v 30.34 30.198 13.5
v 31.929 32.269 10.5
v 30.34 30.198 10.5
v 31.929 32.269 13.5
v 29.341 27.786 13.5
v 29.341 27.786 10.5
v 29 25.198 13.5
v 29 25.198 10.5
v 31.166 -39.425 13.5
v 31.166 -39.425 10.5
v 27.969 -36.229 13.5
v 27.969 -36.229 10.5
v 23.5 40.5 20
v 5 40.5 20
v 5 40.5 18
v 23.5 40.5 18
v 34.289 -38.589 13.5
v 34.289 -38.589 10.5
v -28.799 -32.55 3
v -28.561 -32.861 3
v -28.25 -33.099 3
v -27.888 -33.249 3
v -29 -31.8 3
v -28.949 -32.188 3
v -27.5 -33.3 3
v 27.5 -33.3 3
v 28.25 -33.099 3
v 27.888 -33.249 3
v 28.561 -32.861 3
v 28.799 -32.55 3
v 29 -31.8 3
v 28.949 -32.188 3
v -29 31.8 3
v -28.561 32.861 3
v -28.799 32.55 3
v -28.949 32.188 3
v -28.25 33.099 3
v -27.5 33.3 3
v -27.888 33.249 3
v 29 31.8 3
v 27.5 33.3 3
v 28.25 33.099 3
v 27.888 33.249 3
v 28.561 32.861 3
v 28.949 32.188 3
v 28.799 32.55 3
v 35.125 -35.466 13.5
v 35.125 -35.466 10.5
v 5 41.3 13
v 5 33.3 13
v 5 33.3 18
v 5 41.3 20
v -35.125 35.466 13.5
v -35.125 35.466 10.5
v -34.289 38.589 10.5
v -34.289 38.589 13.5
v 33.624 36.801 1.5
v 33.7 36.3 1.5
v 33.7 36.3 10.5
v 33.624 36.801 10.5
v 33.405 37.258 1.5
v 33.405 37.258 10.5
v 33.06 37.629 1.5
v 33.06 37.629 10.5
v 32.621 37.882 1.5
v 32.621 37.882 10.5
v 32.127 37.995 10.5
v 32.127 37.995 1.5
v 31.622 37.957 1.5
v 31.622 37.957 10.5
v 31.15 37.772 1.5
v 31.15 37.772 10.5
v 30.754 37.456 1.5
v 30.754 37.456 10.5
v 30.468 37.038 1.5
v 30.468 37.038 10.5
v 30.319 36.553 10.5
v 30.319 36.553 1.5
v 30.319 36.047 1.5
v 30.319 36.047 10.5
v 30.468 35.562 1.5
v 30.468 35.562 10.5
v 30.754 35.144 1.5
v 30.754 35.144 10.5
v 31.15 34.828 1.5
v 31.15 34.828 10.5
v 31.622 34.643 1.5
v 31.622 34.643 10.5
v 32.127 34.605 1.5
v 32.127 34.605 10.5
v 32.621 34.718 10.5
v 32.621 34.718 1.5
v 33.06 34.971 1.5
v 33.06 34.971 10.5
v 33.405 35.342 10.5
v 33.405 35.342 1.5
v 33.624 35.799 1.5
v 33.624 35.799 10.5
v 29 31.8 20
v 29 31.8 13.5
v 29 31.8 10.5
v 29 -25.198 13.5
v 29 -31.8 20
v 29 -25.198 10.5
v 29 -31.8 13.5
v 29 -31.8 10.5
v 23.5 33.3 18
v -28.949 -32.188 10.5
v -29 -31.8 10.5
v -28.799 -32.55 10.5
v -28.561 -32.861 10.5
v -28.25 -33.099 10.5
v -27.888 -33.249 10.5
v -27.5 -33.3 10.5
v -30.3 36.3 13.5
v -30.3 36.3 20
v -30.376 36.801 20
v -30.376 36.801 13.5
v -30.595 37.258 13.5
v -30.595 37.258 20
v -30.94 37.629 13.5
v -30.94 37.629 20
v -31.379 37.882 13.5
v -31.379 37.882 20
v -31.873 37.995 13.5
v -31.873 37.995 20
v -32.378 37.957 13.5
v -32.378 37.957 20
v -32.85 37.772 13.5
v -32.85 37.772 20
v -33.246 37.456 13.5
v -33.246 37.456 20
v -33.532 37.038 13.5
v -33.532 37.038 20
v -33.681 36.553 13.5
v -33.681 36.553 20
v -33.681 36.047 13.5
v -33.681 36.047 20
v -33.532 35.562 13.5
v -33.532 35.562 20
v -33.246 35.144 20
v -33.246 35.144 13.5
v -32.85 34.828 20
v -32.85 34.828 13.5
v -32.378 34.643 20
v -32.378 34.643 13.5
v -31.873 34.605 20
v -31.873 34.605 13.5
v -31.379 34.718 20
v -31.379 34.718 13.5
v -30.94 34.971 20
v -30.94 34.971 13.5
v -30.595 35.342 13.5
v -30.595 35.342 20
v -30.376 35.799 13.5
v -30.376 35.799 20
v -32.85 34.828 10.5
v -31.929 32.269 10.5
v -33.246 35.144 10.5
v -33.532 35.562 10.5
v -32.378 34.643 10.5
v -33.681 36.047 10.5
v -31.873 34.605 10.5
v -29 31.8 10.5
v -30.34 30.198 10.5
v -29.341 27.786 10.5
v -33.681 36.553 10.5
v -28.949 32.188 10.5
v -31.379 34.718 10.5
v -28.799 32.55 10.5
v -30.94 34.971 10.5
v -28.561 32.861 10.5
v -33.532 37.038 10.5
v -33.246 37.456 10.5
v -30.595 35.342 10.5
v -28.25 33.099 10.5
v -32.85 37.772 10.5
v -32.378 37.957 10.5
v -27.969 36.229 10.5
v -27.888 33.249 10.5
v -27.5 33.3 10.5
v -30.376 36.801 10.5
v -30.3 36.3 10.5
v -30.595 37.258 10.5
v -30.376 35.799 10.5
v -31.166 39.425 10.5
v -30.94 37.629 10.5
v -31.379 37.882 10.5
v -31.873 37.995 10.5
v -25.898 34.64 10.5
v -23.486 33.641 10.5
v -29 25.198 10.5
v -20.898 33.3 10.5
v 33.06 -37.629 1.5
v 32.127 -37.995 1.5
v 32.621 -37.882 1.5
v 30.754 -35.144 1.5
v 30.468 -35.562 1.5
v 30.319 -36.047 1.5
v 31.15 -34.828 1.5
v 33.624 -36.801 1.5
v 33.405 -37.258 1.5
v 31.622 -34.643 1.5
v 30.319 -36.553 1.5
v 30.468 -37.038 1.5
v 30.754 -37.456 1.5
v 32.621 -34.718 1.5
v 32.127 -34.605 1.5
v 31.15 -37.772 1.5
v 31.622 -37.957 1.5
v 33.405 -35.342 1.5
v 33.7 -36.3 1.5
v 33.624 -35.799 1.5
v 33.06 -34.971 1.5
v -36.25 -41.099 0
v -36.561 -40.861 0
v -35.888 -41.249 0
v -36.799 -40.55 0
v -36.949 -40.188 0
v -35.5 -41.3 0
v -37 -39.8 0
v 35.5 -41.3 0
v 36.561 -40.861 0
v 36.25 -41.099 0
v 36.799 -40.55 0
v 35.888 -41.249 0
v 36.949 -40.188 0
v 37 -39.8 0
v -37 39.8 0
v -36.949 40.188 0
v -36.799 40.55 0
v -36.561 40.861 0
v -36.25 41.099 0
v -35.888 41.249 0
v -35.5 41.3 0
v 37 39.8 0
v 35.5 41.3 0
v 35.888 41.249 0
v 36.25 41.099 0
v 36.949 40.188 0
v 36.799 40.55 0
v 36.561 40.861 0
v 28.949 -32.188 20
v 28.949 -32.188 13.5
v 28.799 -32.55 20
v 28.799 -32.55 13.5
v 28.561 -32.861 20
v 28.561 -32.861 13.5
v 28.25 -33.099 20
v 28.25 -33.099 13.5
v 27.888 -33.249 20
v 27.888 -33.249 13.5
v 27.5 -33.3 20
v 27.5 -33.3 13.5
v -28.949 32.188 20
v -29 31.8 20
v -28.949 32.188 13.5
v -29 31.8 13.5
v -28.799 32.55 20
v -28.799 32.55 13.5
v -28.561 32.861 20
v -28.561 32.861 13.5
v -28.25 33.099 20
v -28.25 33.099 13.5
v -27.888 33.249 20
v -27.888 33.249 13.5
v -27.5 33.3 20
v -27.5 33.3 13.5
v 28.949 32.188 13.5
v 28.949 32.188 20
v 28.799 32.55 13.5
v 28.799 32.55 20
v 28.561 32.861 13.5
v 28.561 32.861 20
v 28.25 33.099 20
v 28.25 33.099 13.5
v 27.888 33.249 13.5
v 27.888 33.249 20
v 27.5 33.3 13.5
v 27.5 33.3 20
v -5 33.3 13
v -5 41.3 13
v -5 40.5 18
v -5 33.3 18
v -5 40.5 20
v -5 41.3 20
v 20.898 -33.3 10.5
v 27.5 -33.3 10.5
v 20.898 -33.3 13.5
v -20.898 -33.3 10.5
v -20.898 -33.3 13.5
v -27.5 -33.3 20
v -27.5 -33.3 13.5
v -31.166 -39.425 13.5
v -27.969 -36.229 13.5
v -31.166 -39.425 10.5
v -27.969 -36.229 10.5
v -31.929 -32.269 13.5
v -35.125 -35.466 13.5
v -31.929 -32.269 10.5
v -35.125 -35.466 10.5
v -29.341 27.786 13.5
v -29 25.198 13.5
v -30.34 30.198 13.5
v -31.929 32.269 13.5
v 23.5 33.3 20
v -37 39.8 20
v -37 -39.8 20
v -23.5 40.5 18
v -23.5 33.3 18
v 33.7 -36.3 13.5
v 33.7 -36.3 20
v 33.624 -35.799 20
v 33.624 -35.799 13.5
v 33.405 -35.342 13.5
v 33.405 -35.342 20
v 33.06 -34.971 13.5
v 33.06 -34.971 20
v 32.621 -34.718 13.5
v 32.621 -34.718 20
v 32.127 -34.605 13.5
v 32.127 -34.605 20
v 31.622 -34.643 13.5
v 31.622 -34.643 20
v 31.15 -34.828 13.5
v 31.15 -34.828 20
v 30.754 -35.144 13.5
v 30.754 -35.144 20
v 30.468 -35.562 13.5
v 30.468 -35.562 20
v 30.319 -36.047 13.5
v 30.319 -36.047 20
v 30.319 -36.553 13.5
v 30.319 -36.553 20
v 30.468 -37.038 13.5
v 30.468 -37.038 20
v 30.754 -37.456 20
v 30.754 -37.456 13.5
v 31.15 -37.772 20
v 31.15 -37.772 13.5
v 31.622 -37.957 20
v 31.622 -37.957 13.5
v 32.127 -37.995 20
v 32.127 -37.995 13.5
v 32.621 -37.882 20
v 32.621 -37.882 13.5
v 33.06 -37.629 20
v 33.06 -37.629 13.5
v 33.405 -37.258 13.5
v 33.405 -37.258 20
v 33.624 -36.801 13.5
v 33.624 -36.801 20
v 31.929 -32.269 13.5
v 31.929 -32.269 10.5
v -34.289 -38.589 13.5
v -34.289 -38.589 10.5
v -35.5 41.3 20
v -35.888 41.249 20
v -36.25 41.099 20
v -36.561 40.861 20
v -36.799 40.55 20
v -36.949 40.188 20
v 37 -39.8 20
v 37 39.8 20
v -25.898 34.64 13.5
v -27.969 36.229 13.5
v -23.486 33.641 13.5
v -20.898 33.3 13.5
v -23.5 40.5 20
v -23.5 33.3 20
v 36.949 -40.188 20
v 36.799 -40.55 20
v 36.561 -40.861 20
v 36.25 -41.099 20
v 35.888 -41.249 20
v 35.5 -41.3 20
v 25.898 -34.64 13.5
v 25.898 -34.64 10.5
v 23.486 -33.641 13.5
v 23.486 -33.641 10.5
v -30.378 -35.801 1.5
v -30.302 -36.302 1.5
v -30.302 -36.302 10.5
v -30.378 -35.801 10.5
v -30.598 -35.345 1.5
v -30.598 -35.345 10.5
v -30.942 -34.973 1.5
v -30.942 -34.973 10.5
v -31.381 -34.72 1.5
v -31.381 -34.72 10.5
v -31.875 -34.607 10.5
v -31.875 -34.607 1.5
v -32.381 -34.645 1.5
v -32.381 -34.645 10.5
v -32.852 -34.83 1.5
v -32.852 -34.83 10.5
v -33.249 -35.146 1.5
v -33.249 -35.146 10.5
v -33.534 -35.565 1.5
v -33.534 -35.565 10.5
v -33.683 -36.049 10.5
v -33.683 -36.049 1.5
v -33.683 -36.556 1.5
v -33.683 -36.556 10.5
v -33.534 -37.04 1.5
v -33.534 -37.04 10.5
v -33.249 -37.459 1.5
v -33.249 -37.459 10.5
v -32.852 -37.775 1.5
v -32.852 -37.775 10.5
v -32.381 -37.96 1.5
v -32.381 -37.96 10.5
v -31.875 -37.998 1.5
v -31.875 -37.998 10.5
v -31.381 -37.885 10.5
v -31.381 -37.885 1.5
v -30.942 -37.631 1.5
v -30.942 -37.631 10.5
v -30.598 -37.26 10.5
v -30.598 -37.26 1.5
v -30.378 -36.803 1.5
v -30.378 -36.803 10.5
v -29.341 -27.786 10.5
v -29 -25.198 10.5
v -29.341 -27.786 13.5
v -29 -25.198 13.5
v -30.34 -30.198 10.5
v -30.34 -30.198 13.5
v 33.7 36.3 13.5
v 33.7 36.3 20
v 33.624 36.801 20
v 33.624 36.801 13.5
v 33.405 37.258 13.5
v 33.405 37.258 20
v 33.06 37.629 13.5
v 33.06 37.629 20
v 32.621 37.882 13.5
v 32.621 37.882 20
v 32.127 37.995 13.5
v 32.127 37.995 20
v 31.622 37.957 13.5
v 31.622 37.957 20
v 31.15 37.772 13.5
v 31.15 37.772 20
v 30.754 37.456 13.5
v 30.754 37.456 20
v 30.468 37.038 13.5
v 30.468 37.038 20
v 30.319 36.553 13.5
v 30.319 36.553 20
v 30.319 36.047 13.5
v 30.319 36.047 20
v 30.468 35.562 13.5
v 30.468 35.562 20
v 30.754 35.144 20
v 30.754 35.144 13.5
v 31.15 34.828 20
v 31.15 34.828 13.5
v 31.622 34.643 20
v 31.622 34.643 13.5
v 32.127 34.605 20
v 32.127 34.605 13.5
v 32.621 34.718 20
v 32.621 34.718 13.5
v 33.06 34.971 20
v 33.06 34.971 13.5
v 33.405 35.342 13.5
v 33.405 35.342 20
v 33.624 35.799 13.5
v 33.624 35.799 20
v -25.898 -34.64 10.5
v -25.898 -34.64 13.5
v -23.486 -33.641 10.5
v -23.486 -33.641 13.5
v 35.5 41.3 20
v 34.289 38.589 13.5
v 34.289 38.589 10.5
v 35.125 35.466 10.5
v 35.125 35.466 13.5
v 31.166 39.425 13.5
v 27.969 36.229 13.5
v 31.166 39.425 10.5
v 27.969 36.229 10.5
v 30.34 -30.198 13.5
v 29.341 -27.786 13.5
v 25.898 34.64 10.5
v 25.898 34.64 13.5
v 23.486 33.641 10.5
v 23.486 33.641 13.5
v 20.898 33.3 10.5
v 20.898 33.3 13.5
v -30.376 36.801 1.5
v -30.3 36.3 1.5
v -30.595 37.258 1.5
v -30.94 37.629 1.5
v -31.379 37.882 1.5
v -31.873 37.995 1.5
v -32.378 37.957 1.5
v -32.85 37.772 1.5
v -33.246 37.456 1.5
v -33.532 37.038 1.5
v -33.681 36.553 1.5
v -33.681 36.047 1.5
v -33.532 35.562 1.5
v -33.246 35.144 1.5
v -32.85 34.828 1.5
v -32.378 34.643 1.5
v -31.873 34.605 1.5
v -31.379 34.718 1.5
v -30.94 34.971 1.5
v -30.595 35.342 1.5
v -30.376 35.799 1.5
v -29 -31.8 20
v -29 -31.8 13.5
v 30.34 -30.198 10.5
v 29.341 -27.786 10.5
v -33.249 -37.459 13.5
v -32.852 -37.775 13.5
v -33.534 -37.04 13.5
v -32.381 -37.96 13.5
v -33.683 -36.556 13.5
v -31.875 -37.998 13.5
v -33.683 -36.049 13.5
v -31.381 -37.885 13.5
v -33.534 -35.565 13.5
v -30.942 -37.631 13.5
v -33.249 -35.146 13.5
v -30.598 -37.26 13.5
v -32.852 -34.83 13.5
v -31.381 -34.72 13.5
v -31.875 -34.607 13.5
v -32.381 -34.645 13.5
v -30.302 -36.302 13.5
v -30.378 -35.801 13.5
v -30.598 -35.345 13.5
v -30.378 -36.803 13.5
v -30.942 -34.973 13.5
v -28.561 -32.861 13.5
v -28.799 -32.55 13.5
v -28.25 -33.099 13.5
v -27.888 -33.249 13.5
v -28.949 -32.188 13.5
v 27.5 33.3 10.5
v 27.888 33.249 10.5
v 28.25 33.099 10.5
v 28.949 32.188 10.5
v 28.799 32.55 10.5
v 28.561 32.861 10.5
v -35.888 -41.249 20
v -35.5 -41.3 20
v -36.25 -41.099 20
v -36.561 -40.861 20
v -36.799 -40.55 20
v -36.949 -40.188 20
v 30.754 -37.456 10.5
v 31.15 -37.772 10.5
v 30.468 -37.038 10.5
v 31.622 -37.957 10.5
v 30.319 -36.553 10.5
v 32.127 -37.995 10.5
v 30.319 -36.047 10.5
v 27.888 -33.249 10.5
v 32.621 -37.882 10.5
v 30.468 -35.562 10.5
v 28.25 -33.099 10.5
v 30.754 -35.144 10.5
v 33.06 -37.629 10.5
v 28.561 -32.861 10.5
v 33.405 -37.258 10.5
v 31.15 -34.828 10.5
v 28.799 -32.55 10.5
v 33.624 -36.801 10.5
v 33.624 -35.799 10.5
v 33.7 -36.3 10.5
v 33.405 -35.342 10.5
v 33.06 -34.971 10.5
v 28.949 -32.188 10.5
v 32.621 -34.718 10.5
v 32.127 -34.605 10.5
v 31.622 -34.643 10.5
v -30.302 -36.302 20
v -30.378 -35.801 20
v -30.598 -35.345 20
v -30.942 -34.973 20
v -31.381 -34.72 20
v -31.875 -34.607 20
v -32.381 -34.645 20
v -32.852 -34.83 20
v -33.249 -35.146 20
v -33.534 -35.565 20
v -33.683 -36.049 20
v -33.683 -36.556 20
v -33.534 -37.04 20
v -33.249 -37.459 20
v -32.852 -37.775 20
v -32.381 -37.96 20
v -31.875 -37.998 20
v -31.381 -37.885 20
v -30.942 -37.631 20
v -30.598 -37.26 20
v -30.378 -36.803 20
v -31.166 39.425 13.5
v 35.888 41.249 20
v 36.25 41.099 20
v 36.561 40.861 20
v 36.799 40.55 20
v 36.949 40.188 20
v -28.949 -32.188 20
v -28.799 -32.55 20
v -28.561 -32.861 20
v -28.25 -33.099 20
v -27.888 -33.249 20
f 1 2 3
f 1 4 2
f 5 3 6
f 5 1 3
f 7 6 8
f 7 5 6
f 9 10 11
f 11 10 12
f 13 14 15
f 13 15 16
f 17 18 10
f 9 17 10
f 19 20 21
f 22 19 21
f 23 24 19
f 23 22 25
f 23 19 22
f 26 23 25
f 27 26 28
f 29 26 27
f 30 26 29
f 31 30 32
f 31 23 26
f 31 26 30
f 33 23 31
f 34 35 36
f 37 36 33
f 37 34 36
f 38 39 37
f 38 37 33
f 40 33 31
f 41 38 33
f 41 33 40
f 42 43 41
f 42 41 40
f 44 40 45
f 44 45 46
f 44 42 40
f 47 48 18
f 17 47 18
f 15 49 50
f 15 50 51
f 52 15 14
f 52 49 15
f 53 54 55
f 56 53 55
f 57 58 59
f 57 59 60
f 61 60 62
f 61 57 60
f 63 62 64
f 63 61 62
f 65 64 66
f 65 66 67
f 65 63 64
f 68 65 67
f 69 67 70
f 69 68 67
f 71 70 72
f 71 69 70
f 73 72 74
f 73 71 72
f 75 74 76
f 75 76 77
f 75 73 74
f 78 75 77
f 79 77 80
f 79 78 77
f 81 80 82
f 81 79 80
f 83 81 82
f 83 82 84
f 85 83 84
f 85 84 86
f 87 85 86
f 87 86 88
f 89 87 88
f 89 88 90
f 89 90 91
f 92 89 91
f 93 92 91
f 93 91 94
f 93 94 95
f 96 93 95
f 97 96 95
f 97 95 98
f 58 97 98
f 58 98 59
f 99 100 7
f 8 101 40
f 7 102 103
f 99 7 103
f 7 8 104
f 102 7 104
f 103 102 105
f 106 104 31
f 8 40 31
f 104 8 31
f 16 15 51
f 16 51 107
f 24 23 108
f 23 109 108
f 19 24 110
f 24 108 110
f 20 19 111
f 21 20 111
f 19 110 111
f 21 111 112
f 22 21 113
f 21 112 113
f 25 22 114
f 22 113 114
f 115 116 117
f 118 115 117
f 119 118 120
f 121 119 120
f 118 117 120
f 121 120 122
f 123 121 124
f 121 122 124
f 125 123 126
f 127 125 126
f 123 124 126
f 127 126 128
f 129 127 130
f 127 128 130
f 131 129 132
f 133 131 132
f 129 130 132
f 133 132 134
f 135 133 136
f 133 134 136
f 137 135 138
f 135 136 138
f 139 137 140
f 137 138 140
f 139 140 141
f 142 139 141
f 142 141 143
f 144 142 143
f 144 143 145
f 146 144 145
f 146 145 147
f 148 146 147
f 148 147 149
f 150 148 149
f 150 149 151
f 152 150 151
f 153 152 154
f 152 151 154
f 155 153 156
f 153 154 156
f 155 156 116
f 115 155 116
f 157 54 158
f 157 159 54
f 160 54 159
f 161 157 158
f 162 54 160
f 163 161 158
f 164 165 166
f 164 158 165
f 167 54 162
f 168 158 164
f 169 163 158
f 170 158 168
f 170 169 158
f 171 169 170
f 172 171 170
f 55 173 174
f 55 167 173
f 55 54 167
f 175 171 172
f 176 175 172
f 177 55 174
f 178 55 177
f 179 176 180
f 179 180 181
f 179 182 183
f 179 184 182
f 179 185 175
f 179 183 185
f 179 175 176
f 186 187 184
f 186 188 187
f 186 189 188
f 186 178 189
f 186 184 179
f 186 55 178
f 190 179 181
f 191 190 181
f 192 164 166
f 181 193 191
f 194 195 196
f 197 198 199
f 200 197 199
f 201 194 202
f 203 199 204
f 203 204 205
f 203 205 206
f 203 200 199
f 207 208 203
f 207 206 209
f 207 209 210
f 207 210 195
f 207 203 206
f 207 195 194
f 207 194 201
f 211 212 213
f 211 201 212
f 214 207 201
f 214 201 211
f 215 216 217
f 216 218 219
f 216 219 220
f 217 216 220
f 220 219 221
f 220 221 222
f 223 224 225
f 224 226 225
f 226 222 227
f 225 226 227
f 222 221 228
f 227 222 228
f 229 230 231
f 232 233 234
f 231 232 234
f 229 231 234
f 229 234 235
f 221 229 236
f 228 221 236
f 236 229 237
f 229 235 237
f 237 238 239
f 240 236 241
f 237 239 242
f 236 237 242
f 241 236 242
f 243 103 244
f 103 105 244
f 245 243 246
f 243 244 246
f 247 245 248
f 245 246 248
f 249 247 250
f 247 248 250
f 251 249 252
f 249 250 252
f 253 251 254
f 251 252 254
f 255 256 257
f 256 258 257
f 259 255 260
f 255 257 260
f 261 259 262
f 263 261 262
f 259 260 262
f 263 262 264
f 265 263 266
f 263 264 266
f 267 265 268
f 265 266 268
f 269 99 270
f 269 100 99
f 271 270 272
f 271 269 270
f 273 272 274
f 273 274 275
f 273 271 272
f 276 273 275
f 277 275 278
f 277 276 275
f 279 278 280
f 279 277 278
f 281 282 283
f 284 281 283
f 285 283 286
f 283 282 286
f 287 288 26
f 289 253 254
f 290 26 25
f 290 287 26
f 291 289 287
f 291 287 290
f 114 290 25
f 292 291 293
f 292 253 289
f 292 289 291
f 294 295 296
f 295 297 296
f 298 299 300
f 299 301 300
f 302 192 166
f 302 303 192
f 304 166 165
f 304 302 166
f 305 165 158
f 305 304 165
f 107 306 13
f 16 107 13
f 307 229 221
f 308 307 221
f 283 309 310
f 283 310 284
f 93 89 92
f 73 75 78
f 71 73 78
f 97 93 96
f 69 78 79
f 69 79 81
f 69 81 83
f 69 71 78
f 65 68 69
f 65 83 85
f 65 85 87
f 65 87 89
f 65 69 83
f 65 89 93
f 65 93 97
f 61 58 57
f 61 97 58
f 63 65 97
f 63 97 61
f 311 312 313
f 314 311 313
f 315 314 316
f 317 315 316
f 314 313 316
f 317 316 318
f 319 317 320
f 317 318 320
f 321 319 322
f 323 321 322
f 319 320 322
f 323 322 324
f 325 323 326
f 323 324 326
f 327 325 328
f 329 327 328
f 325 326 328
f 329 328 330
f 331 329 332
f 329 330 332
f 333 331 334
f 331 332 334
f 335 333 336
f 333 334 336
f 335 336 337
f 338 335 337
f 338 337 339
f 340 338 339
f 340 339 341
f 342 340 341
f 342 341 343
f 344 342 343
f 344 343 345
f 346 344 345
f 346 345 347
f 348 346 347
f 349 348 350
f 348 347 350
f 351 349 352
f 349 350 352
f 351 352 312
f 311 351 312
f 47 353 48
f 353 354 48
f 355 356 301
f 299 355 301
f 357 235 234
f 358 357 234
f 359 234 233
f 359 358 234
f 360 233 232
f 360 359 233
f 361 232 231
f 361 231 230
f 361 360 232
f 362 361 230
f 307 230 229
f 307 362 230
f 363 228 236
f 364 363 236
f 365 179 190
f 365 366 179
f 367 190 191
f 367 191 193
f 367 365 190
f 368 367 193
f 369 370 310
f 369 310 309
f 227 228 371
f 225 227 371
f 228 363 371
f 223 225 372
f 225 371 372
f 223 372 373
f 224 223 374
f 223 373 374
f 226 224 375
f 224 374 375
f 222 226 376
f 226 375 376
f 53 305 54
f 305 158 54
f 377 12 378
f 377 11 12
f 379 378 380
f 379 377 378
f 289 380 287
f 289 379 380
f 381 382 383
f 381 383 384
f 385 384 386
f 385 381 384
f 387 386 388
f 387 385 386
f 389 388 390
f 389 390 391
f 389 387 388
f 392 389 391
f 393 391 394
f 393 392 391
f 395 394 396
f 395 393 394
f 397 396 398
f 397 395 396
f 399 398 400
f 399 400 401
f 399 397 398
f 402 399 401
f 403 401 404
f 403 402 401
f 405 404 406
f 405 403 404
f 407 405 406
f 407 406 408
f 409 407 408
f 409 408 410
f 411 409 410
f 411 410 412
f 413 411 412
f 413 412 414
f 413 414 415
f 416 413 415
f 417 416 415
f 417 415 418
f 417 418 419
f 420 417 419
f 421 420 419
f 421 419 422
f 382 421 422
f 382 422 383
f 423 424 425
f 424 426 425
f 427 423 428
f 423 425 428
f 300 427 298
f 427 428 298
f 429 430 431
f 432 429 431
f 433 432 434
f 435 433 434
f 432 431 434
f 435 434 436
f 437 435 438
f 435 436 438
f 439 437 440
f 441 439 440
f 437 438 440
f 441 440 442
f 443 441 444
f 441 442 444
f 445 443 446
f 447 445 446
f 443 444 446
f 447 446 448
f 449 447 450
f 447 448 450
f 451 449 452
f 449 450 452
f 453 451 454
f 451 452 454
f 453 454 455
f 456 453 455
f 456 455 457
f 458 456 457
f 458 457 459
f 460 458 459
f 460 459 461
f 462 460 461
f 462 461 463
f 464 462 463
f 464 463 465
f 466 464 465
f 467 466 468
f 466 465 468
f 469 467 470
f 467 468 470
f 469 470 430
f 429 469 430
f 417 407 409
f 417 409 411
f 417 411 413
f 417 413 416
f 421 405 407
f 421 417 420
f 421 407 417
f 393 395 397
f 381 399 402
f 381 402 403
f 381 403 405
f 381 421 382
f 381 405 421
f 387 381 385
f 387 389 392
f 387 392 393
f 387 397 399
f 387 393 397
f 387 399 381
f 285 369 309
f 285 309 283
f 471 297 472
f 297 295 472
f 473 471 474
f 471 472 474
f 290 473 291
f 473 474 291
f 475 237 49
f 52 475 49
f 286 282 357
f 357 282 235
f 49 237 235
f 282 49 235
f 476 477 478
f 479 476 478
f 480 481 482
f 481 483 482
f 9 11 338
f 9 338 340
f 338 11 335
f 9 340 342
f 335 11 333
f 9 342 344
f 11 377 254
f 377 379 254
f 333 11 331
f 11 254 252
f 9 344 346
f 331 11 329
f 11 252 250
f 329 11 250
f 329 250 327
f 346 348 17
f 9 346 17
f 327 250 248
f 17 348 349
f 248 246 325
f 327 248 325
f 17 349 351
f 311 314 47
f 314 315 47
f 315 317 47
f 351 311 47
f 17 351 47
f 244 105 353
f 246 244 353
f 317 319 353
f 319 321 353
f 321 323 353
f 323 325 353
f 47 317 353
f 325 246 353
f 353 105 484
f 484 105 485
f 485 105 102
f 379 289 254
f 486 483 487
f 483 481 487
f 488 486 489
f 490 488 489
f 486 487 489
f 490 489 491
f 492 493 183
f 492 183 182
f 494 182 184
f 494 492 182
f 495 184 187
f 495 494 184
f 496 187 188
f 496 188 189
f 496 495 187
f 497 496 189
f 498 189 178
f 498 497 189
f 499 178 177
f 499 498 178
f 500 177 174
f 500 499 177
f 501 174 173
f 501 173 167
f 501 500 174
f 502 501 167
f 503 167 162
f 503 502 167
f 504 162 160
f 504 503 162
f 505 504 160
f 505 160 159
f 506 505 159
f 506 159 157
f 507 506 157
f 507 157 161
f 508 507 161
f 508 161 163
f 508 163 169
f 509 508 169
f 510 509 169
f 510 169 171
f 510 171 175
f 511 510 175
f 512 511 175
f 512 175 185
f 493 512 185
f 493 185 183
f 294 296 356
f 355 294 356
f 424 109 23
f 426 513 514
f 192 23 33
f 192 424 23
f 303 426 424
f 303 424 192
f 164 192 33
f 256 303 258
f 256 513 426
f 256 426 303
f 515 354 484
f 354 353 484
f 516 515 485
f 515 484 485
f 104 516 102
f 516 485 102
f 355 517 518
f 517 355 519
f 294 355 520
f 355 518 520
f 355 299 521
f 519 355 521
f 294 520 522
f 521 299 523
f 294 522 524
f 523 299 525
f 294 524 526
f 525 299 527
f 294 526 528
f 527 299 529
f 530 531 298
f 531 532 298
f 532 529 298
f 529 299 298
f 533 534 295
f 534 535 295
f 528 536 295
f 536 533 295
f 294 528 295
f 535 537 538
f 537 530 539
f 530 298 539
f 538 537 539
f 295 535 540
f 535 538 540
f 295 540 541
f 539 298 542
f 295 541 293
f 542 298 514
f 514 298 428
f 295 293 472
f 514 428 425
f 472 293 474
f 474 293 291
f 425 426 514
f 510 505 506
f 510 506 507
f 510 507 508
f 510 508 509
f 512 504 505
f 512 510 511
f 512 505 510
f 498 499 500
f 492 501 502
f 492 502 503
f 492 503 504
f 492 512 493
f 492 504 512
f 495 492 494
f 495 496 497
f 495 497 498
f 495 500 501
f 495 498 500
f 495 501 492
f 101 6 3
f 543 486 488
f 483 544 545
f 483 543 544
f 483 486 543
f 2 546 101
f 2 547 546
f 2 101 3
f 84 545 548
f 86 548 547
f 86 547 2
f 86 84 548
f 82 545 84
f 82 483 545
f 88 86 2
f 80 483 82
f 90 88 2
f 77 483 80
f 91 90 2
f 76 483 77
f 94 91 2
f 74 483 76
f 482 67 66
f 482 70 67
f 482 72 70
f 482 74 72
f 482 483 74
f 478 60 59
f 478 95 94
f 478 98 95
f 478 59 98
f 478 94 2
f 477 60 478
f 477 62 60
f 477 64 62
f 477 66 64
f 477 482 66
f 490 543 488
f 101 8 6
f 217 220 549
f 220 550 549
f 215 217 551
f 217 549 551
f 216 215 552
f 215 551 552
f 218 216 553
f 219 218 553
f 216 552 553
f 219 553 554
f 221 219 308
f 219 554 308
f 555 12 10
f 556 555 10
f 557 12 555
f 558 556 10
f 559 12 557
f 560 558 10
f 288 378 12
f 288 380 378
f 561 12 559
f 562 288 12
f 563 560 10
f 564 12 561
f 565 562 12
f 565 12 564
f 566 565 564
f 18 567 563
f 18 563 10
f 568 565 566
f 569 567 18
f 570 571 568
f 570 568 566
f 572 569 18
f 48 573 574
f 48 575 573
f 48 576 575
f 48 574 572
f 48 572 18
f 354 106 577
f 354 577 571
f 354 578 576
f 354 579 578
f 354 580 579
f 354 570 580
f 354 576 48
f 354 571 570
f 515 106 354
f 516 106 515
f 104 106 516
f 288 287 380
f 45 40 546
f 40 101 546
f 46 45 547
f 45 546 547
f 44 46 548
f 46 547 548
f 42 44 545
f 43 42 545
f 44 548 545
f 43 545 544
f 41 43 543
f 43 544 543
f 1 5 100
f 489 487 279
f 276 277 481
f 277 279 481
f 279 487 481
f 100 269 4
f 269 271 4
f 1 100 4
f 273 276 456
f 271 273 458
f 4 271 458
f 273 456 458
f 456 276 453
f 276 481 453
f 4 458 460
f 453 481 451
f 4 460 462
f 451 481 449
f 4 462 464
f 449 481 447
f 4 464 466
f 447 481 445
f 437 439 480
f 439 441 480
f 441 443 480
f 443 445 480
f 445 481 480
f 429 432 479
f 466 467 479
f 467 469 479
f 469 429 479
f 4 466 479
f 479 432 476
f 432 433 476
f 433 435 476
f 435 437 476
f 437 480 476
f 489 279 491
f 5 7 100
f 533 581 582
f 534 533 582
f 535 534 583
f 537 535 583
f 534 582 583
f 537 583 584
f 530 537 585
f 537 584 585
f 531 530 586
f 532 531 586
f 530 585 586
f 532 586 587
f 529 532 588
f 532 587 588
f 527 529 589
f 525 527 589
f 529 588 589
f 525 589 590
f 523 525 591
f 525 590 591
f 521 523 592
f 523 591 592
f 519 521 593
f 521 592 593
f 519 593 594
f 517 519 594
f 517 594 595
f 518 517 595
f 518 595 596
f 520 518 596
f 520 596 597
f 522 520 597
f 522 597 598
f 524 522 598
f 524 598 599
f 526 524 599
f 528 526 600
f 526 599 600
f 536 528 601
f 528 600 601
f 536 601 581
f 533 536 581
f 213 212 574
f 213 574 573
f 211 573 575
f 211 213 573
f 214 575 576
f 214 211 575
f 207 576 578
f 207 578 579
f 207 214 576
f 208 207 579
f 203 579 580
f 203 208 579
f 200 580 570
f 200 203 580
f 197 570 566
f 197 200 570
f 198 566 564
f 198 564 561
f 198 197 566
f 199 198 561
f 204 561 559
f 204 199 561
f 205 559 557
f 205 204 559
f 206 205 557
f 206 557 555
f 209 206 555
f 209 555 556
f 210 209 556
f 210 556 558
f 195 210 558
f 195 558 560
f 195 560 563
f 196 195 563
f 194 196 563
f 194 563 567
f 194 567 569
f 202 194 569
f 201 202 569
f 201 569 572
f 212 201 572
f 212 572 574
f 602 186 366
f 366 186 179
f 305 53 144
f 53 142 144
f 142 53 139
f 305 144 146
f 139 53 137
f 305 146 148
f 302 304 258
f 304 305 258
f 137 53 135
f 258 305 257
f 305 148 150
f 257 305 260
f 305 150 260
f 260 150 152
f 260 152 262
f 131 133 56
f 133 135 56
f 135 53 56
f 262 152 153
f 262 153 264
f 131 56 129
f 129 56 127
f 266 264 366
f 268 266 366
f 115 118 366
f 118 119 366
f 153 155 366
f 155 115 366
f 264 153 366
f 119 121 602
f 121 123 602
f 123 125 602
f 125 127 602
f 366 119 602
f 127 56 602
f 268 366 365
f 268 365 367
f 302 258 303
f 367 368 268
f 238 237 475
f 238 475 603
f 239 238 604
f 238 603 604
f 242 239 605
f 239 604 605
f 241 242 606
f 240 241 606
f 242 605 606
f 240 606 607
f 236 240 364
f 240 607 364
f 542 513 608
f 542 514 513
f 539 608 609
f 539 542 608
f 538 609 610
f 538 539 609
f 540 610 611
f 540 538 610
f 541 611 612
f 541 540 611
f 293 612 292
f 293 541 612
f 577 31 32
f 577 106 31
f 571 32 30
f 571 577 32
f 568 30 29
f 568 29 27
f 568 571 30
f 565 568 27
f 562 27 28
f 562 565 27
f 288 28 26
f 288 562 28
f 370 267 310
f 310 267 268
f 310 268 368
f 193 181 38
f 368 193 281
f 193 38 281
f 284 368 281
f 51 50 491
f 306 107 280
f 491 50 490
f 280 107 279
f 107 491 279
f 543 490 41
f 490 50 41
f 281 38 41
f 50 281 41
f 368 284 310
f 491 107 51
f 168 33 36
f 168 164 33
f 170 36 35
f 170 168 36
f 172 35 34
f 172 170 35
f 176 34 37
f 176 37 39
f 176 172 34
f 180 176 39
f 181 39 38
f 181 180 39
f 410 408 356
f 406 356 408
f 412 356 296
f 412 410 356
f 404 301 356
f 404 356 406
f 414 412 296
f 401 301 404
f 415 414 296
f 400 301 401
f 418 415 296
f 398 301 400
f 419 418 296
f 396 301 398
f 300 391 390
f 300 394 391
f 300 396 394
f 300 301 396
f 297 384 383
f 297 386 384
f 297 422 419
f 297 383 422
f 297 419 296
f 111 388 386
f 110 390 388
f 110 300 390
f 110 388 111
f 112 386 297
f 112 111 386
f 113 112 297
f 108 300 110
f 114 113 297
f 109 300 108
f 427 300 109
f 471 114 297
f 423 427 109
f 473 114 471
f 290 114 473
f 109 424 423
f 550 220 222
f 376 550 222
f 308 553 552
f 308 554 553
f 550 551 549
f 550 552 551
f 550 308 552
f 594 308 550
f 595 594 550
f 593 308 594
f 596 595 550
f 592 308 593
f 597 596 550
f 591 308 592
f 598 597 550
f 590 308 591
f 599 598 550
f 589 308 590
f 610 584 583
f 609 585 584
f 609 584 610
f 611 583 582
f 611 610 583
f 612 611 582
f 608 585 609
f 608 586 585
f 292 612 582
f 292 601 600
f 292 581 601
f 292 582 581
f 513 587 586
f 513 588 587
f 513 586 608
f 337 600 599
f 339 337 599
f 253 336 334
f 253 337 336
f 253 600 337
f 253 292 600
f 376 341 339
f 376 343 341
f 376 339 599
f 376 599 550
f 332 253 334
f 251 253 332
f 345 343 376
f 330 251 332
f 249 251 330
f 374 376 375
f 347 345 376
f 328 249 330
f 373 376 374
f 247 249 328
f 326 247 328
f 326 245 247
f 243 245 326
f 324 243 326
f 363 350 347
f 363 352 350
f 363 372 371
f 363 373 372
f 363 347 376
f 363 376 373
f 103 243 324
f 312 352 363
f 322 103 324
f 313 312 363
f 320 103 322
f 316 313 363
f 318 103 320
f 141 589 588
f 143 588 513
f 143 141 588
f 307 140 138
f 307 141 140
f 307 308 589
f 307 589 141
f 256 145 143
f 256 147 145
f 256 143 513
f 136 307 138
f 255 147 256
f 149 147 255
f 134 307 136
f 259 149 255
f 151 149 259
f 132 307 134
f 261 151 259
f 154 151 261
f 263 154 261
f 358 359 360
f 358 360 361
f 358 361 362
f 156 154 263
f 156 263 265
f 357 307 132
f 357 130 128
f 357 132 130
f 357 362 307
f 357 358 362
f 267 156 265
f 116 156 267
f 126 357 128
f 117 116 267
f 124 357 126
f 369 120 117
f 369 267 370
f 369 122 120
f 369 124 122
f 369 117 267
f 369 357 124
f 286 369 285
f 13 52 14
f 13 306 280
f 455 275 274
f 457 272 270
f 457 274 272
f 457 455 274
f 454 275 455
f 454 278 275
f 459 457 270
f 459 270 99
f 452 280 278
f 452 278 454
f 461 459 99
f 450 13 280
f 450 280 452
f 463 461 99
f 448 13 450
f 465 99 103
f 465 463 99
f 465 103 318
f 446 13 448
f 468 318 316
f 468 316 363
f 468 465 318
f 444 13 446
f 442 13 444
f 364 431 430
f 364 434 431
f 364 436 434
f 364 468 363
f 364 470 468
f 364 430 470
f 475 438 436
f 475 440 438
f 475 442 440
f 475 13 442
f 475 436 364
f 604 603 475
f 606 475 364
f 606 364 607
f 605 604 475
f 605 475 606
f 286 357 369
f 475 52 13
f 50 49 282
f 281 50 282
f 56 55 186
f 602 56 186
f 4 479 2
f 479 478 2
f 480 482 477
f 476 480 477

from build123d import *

# Parameters (mm, degrees)
F1_DEPTH  = 20
F2_DEPTH  = 3
F0_R      = 1.7
F3_DEPTH  = 10.5
F4_R      = 1.7
F5_DEPTH  = 6.5
F6_R      = 10
F7_R      = 1.5
F8_DEPTH  = 1.5
F9_W      = 10
F9_H      = 7
F10_DEPTH = 10
F12_W     = 18.5
F12_H     = 7.2
F13_DEPTH = 2


with BuildPart() as f1:
    # F0 (on Top) → F1 (new body)
    with BuildSketch(Plane.XY):
        Polygon((-37, 31.3), (-37, -41.3), (37, -41.3), (37, 31.3), (37, 41.3), (-37, 41.3), align=None)
        Polygon((-28.8793207629, 37.1391206695), (-25.0402000934, 33.3), (25.0402000934, 33.3), (28.8793207629, 37.1391206695), (31.1655111895, 39.4253110961), (34.2885053902, 38.5885073221), (35.1253091642, 35.4655131215), (32.8391187376, 33.1793226949), (29, 29.3402039573), (29, -29.3402039573), (32.8391187376, -33.1793226949), (35.1253091642, -35.4655131215), (34.2885053902, -38.5885073221), (31.1655111895, -39.4253110961), (28.8793207629, -37.1391206695), (25.0402000934, -33.3), (-25.0402000934, -33.3), (-28.8793207629, -37.1391206695), (-31.1655111895, -39.4253110961), (-34.2885053902, -38.5885073221), (-35.1253091642, -35.4655131215), (-32.8391187376, -33.1793226949), (-29, -29.3402039573), (-29, 29.3402039573), (-32.8391187376, 33.1793226949), (-35.1253091642, 35.4655131215), (-34.2885053902, 38.5885073221), (-31.1655111895, 39.4253110961), align=None, mode=Mode.SUBTRACT)
    extrude(amount=F1_DEPTH)

    # F0 (on Top) → F2 (join)
    with BuildSketch(Plane.XY):
        Polygon((-25.0402000934, 33.3), (-29, 33.3), (-29, 29.3402039573), (-29, -29.3402039573), (-29, -33.3), (-25.0402000934, -33.3), (25.0402000934, -33.3), (29, -33.3), (29, -29.3402039573), (29, 29.3402039573), (29, 33.3), (25.0402000934, 33.3), align=None)
    extrude(amount=F2_DEPTH)

    # F0 (on Top) → F3 (join)
    with BuildSketch(Plane.XY):
        Polygon((-29, 29.3402039573), (-29, 33.3), (-25.0402000934, 33.3), (-28.8793207629, 37.1391206695), (-29.716124537, 34.0161264689), (-32.8391187376, 33.1793226949), align=None)
        Polygon((-29.716124537, 34.0161264689), (-28.8793207629, 37.1391206695), (-31.1655111895, 39.4253110961), (-34.2885053902, 38.5885073221), (-35.1253091642, 35.4655131215), (-32.8391187376, 33.1793226949), align=None)
        with Locations((-32, 36.3)):
            Circle(F0_R, mode=Mode.SUBTRACT)
        Polygon((28.8793207629, 37.1391206695), (25.0402000934, 33.3), (29, 33.3), (29, 29.3402039573), (32.8391187376, 33.1793226949), (29.716124537, 34.0161264689), align=None)
        Polygon((31.1655111895, 39.4253110961), (28.8793207629, 37.1391206695), (29.716124537, 34.0161264689), (32.8391187376, 33.1793226949), (35.1253091642, 35.4655131215), (34.2885053902, 38.5885073221), align=None)
        with Locations((32, 36.3)):
            Circle(F0_R, mode=Mode.SUBTRACT)
        Polygon((32.8391187376, -33.1793226949), (29, -29.3402039573), (29, -33.3), (25.0402000934, -33.3), (28.8793207629, -37.1391206695), (29.716124537, -34.0161264689), align=None)
        Polygon((-29, -33.3), (-29, -29.3402039573), (-32.8391187376, -33.1793226949), (-29.716124537, -34.0161264689), (-28.8793207629, -37.1391206695), (-25.0402000934, -33.3), align=None)
        Polygon((-29.716124537, -34.0161264689), (-32.8391187376, -33.1793226949), (-35.1253091642, -35.4655131215), (-34.2885053902, -38.5885073221), (-31.1655111895, -39.4253110961), (-28.8793207629, -37.1391206695), align=None)
        with Locations((-32.0023149636, -36.3023168955)):
            Circle(F0_R, mode=Mode.SUBTRACT)
        Polygon((35.1253091642, -35.4655131215), (32.8391187376, -33.1793226949), (29.716124537, -34.0161264689), (28.8793207629, -37.1391206695), (31.1655111895, -39.4253110961), (34.2885053902, -38.5885073221), align=None)
        with Locations((32, -36.3)):
            Circle(F0_R, mode=Mode.SUBTRACT)
    extrude(amount=F3_DEPTH)

    # F4 (on face) → F5 (join)
    with BuildSketch(Plane.XY.offset(20)):
        Polygon((-29, -29.3402039573), (-32.8391187376, -33.1793226949), (-29.716124537, -34.0161264689), (-28.8793207629, -37.1391206695), (-25.0402000934, -33.3), (-29, -33.3), align=None)
        Polygon((-29.716124537, -34.0161264689), (-32.8391187376, -33.1793226949), (-35.1253091642, -35.4655131215), (-34.2885053902, -38.5885073221), (-31.1655111895, -39.4253110961), (-28.8793207629, -37.1391206695), align=None)
        with Locations((-32.0023149636, -36.3023168955)):
            Circle(F4_R, mode=Mode.SUBTRACT)
        Polygon((29, -33.3), (25.0402000934, -33.3), (28.8793207629, -37.1391206695), (29.716124537, -34.0161264689), (32.8391187376, -33.1793226949), (29, -29.3402039573), align=None)
        Polygon((29.716124537, -34.0161264689), (28.8793207629, -37.1391206695), (31.1655111895, -39.4253110961), (34.2885053902, -38.5885073221), (35.1253091642, -35.4655131215), (32.8391187376, -33.1793226949), align=None)
        with Locations((32, -36.3)):
            Circle(F4_R, mode=Mode.SUBTRACT)
        Polygon((28.8793207629, 37.1391206695), (25.0402000934, 33.3), (29, 33.3), (29, 29.3402039573), (32.8391187376, 33.1793226949), (29.716124537, 34.0161264689), align=None)
        Polygon((31.1655111895, 39.4253110961), (28.8793207629, 37.1391206695), (29.716124537, 34.0161264689), (32.8391187376, 33.1793226949), (35.1253091642, 35.4655131215), (34.2885053902, 38.5885073221), align=None)
        with Locations((32, 36.3)):
            Circle(F4_R, mode=Mode.SUBTRACT)
        Polygon((-32.8391187376, 33.1793226949), (-29, 29.3402039573), (-29, 33.3), (-25.0402000934, 33.3), (-28.8793207629, 37.1391206695), (-29.716124537, 34.0161264689), align=None)
        Polygon((-35.1253091642, 35.4655131215), (-32.8391187376, 33.1793226949), (-29.716124537, 34.0161264689), (-28.8793207629, 37.1391206695), (-31.1655111895, 39.4253110961), (-34.2885053902, 38.5885073221), align=None)
        with Locations((-32, 36.3)):
            Circle(F4_R, mode=Mode.SUBTRACT)
    extrude(amount=-F5_DEPTH)

    # F6
    f6_edges = [f1.edges().sort_by_distance(p)[0] for p in [
        (29, 29.340204, 12),
        (25.0402, 33.3, 12),
        (29, -29.340204, 12),
        (25.0402, -33.3, 12),
        (-29, 29.340204, 12),
        (-25.0402, 33.3, 12),
        (-25.0402, -33.3, 12),
        (-29, -29.340204, 12),
    ]]
    fillet(f6_edges, radius=F6_R)

    # F7
    f7_edges = [f1.edges().sort_by_distance(p)[0] for p in [
        (-37, -41.3, 10),
        (37, -41.3, 10),
        (-37, 41.3, 10),
        (37, 41.3, 10),
        (-29, 33.3, 6.75),
        (-29, 33.3, 16.75),
        (29, 33.3, 6.75),
        (29, 33.3, 16.75),
        (-29, -33.3, 6.75),
        (-29, -33.3, 16.75),
        (29, -33.3, 6.75),
        (29, -33.3, 16.75),
    ]]
    fillet(f7_edges, radius=F7_R)

    # F0 (on Top) → F8 (join)
    with BuildSketch(Plane.XY):
        with Locations((32, -36.3)):
            Circle(F0_R)
        with Locations((32, 36.3)):
            Circle(F0_R)
        with Locations((-32.0023149636, -36.3023168955)):
            Circle(F0_R)
        with Locations((-32, 36.3)):
            Circle(F0_R)
    extrude(amount=F8_DEPTH)

    # F9 (on face) → F10 (cut)
    with BuildSketch(Plane(origin=(0, 41.3, 0), x_dir=(-1, 0, 0), z_dir=(0, 1, 0))):
        with Locations((0, 16.5)):
            Rectangle(F9_W, F9_H)
    extrude(amount=-F10_DEPTH, mode=Mode.SUBTRACT)

    # F12 (on face) → F13 (cut)
    with BuildSketch(Plane.XY.offset(20)):
        with Locations((-14.25, 36.9)):
            Rectangle(F12_W, F12_H)
        with Locations((14.25, 36.9)):
            Rectangle(F12_W, F12_H)
    extrude(amount=-F13_DEPTH, mode=Mode.SUBTRACT)


solid = f1.part
